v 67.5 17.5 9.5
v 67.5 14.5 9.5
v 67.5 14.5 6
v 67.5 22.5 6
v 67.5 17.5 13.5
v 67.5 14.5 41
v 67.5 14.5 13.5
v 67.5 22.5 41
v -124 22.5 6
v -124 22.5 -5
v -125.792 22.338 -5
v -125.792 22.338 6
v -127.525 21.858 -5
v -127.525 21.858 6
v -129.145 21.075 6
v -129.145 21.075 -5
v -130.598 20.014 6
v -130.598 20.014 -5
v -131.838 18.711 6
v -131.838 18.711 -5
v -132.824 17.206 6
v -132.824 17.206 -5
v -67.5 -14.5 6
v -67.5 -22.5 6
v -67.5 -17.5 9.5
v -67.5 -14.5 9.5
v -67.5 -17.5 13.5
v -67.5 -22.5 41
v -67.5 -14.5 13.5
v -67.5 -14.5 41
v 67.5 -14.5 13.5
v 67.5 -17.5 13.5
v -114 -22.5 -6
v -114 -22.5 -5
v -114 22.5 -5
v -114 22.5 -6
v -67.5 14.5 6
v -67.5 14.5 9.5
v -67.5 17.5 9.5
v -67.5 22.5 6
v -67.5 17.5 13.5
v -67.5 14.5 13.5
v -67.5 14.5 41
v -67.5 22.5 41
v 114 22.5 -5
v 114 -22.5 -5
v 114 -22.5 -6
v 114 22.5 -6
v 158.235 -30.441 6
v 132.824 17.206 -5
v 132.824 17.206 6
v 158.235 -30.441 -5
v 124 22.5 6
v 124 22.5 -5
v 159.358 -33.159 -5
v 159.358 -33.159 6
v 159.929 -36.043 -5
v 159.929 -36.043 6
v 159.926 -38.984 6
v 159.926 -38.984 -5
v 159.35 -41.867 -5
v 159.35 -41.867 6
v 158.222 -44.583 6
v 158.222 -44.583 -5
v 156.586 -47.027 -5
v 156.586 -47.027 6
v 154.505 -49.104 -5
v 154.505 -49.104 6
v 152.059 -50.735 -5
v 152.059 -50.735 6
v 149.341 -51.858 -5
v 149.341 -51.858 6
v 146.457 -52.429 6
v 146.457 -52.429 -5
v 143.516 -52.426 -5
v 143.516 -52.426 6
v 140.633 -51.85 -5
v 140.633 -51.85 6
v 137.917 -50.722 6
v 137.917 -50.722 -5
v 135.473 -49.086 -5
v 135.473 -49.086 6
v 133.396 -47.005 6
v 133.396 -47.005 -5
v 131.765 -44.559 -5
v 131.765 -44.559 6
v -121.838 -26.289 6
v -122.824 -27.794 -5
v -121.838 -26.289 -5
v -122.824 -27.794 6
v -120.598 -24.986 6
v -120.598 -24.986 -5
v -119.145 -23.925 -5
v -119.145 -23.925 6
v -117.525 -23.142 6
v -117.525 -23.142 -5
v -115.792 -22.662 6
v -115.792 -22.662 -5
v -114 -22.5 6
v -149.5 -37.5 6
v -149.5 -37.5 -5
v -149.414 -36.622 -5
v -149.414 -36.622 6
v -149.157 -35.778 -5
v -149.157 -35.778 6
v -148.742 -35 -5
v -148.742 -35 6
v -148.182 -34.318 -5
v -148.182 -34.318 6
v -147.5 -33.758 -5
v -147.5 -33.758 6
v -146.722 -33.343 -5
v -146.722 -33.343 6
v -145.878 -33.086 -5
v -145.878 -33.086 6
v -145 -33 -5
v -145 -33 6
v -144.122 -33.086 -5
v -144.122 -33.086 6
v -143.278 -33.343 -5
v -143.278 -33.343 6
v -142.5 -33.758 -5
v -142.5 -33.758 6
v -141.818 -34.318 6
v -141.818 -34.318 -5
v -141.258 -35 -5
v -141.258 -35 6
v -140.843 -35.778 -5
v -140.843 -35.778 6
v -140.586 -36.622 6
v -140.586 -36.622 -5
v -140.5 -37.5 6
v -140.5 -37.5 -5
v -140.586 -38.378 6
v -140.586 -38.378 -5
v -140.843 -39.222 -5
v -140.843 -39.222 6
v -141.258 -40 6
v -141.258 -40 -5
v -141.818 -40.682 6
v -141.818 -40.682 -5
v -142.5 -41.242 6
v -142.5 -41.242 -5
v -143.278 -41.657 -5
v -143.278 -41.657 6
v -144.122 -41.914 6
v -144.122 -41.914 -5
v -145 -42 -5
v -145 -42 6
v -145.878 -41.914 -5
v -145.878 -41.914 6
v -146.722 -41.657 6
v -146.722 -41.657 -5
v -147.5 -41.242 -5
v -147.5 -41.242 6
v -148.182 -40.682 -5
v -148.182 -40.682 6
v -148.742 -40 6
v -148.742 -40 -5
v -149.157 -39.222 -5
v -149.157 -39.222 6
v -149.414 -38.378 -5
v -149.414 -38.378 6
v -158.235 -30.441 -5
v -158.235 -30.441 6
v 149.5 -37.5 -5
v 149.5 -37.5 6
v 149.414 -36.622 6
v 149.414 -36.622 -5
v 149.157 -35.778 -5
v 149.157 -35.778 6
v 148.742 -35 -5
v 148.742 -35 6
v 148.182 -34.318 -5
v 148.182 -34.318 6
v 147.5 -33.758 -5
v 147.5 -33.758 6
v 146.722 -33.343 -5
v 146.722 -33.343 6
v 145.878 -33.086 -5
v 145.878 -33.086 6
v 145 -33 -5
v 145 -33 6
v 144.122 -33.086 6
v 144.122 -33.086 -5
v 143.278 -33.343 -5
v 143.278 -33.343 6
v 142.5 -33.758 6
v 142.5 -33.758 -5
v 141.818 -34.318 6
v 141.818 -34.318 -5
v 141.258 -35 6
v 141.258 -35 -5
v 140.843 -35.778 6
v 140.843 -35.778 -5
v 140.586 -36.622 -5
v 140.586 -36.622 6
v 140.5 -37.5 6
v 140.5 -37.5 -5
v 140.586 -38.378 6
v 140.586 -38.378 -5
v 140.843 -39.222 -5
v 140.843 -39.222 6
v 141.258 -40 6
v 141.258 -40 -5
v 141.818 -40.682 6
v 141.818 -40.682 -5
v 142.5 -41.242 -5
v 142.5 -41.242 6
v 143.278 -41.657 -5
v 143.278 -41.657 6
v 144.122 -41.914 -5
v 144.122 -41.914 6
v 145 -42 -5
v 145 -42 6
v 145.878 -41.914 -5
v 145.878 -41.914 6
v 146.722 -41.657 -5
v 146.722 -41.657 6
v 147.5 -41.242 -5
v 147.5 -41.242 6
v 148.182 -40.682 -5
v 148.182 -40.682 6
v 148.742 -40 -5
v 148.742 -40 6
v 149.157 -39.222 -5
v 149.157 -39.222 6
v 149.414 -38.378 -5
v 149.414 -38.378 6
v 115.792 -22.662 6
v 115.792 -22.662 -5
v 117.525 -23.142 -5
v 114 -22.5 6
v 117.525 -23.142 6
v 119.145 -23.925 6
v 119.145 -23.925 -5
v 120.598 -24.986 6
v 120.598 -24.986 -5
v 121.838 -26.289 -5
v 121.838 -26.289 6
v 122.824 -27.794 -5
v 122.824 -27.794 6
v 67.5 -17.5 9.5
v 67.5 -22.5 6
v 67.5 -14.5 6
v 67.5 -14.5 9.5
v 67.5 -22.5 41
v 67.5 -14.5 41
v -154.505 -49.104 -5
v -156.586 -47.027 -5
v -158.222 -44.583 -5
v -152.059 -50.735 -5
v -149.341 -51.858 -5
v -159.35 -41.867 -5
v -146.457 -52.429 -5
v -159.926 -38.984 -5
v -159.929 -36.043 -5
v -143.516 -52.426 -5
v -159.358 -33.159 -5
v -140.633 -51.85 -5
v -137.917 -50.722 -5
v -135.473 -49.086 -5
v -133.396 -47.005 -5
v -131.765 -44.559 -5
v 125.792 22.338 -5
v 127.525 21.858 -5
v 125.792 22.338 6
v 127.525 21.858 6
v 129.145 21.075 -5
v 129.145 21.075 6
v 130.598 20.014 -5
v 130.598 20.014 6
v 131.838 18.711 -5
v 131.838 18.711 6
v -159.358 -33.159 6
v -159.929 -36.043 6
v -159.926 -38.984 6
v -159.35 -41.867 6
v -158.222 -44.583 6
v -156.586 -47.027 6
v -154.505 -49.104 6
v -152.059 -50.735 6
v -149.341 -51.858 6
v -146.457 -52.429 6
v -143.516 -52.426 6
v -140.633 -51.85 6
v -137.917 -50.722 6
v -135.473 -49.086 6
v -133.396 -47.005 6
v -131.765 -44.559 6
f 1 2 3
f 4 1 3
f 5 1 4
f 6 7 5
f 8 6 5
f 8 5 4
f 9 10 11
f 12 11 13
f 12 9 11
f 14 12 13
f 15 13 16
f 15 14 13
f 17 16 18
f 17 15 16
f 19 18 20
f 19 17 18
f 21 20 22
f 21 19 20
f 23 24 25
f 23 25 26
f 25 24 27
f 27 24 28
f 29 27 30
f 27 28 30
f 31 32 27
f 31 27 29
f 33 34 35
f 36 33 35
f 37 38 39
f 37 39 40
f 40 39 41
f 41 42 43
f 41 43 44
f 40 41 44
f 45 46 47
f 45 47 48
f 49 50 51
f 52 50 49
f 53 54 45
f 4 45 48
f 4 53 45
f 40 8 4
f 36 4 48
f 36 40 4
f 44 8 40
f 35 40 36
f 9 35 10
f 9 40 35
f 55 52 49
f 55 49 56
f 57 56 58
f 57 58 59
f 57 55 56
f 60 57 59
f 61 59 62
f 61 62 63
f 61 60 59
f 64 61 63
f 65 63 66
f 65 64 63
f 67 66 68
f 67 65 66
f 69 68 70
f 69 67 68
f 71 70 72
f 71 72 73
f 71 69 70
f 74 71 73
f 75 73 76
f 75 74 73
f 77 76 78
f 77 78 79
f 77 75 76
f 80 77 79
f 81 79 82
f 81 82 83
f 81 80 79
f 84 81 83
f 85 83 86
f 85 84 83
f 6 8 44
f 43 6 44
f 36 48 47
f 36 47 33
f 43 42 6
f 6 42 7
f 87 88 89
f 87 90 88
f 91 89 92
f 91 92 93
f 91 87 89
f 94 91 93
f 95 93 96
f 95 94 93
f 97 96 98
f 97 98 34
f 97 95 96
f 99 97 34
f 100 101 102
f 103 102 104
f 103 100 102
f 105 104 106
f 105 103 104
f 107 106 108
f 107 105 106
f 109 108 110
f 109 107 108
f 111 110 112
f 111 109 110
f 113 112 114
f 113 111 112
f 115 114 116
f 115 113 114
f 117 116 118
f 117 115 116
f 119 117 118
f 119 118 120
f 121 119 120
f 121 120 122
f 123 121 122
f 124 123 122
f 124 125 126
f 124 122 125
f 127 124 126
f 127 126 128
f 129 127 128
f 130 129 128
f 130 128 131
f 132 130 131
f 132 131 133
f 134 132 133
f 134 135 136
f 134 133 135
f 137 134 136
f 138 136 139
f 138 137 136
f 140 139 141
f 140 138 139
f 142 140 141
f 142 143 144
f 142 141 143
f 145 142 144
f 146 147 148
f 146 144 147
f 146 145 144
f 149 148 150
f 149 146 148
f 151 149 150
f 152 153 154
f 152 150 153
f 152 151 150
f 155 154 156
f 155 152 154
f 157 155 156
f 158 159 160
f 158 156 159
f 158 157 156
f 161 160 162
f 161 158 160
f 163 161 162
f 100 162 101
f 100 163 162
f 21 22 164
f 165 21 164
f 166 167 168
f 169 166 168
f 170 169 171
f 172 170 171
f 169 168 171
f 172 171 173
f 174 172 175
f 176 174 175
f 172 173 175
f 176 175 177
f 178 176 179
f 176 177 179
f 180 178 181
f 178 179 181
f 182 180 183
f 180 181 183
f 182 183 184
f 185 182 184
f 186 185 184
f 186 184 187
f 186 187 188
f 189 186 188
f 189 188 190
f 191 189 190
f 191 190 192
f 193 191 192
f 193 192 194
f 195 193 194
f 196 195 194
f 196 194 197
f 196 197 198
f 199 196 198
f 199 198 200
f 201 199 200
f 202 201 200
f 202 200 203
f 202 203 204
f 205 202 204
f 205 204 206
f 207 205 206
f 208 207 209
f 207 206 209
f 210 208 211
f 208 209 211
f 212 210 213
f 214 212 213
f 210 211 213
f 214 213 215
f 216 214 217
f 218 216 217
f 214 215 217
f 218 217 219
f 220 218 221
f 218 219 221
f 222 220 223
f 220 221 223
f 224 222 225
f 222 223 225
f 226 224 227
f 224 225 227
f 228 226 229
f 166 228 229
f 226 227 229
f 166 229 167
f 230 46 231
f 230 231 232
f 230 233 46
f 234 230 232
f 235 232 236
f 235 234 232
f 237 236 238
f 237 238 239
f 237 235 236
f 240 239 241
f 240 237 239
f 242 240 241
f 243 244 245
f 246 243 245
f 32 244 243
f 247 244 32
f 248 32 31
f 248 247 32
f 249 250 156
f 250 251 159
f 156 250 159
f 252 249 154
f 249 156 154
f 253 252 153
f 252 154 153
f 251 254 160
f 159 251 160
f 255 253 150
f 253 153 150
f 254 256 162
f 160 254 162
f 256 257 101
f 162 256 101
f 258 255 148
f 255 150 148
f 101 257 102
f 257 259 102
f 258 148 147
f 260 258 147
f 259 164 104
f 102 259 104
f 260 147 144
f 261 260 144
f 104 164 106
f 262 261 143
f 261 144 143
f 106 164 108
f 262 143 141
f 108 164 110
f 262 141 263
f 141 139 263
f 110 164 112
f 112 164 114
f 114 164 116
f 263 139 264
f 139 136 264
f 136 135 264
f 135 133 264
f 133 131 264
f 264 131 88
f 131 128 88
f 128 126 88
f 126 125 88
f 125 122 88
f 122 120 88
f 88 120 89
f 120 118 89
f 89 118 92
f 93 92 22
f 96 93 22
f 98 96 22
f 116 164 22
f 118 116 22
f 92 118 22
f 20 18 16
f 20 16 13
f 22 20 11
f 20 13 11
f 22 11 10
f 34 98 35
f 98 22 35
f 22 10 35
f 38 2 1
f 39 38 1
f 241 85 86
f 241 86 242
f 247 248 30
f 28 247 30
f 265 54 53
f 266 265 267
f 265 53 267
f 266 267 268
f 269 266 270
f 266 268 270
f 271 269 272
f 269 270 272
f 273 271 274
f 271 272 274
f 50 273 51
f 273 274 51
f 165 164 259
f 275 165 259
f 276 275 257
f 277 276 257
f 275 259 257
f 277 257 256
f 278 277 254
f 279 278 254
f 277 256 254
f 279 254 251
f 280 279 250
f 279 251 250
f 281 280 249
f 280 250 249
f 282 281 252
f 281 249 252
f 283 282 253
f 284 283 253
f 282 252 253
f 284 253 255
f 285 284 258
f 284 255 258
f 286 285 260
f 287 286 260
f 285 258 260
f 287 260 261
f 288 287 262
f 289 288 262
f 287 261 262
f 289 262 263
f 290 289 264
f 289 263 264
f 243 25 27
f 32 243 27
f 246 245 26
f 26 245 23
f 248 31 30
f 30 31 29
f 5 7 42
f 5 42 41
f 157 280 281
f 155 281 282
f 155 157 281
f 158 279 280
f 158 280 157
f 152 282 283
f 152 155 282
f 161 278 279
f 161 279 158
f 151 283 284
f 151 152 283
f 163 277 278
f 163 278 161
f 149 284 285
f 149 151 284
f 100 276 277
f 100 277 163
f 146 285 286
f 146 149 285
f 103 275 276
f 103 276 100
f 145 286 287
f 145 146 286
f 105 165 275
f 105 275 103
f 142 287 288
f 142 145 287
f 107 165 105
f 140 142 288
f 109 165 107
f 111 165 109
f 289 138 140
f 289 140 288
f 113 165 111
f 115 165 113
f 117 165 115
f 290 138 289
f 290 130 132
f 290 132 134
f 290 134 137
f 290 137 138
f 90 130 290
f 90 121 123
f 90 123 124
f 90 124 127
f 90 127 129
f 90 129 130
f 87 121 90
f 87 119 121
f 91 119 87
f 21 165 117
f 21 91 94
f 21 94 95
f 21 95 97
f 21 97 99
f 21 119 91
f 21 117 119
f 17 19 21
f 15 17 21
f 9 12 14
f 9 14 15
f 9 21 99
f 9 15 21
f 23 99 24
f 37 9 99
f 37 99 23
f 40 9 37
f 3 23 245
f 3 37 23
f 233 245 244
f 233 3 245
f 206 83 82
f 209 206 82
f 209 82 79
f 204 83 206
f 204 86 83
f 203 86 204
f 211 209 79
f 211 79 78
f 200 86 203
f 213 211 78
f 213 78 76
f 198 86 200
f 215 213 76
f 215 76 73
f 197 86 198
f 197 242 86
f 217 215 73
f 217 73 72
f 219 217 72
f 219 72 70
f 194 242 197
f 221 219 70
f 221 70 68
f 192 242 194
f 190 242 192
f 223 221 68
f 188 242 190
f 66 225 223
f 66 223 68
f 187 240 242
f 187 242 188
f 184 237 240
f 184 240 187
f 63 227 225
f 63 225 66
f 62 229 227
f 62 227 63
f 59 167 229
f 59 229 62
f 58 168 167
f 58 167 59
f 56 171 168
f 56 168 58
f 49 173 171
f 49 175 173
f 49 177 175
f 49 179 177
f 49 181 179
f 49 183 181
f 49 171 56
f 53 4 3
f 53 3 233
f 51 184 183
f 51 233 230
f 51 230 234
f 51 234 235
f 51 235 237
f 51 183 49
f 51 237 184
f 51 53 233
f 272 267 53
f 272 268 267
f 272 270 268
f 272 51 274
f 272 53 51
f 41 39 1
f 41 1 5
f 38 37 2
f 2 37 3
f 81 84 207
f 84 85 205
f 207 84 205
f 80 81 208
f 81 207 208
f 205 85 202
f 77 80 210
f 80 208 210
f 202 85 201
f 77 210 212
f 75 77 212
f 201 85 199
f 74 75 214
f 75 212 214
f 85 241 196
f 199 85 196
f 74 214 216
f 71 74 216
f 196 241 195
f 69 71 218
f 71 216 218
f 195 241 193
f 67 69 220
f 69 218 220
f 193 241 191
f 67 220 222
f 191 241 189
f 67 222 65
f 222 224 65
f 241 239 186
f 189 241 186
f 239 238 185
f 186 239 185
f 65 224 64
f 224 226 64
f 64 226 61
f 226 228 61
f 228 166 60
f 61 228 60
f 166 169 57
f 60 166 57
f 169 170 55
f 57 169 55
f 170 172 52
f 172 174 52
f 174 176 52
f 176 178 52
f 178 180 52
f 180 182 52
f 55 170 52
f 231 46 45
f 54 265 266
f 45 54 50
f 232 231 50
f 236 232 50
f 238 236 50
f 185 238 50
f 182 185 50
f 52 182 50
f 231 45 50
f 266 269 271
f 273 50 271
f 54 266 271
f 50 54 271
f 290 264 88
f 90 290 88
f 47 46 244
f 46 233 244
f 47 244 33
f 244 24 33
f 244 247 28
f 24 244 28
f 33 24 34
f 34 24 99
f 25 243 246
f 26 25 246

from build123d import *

# Parameters (mm, degrees)
SKETCH_1_W          = 220
SKETCH_1_H          = 45
EXTRUDE_1_DEPTH     = 6
EXTRUDE_2_DEPTH     = 35
SKETCH_5_W          = 4
SKETCH_5_H          = 3
CUT_EXTRUDE_3_DEPTH = 194.244663574
SKETCH_6_W          = 220
SKETCH_6_H          = 45
EXTRUDE_3_DEPTH     = 5
EXTRUDE_4_DEPTH     = 11
SKETCH_10_R         = 4.5
CUT_EXTRUDE_4_DEPTH = 172.992005628
FILLET_1_R          = 10
SKETCH_11_W         = 10
SKETCH_11_H         = 8
CUT_EXTRUDE_6_DEPTH = 35
SKETCH_18_W         = 228
SKETCH_18_H         = 45
EXTRUDE_5_DEPTH     = 1


with BuildPart() as part:
    # 草图1 → 凸台-拉伸1 (new body)
    with BuildSketch(Plane.XY):
        Rectangle(SKETCH_1_W, SKETCH_1_H)
    extrude(amount=EXTRUDE_1_DEPTH)

    # 草图2 → 凸台-拉伸2 (add)
    with BuildSketch(Plane.XY.offset(6)):
        Polygon((-77.5, 22.5), (77.5, 22.5), (77.5, 14.5), (75, 14.5), (-75, 14.5), (-77.5, 14.5), align=None)
        Polygon((-75, -14.5), (75, -14.5), (77.5, -14.5), (77.5, -22.5), (-77.5, -22.5), (-77.5, -14.5), align=None)
    extrude(amount=EXTRUDE_2_DEPTH)

    # 草图5 → 切除-拉伸3 (cut, through all)
    with BuildSketch(Plane.ZY.offset(77.5)):
        with Locations((11.5, -16)):
            Rectangle(SKETCH_5_W, SKETCH_5_H)
        with Locations((11.5, 16)):
            Rectangle(SKETCH_5_W, SKETCH_5_H)
    extrude(amount=-CUT_EXTRUDE_3_DEPTH, mode=Mode.SUBTRACT)

    # 草图6 → 凸台-拉伸3 (add)
    with BuildSketch(Plane(origin=(0, 0, 0), x_dir=(-1, 0, 0), z_dir=(0, 0, -1))):
        Rectangle(SKETCH_6_W, SKETCH_6_H)
    extrude(amount=EXTRUDE_3_DEPTH)

    # 草图9 → 凸台-拉伸4 (add)
    with BuildSketch(Plane(origin=(0, 0, -5), x_dir=(-1, 0, 0), z_dir=(0, 0, -1))):
        with BuildLine():
            Line((-110, -22.5), (-110, 22.5))
            Line((-110, 22.5), (-130, 22.5))
            Line((-130, 22.5), (-158.235294118, -30.441176471))
            ThreePointArc((-158.235294118, -30.441176471), (-152.058823529, -50.735294118), (-131.764705882, -44.558823529))
            Line((-131.764705882, -44.558823529), (-120, -22.5))
            Line((-120, -22.5), (-110, -22.5))
        make_face()
    extrude_4 = extrude(amount=-EXTRUDE_4_DEPTH)

    # 草图10 → 切除-拉伸4 (cut, through all)
    with BuildSketch(Plane.XY.offset(6)):
        with Locations((145, -37.5)):
            Circle(SKETCH_10_R)
    cut_extrude_4 = extrude(amount=-CUT_EXTRUDE_4_DEPTH, mode=Mode.SUBTRACT)

    # 镜向1: 凸台-拉伸4, 切除-拉伸4 across plane
    add(extrude_4.mirror(Plane(origin=(0, 0, 0), x_dir=(0, 0, 1), z_dir=(1, 0, 0))))
    add(cut_extrude_4.mirror(Plane(origin=(0, 0, 0), x_dir=(0, 0, 1), z_dir=(1, 0, 0))), mode=Mode.SUBTRACT)

    # 圆角1
    fillet_1_edges = [part.edges().sort_by_distance(p)[0] for p in [
        (-130, 22.5, 0.5),
        (-120, -22.5, 0.5),
        (130, 22.5, 0.5),
        (120, -22.5, 0.5),
    ]]
    fillet(fillet_1_edges, radius=FILLET_1_R)

    # 草图11 → 切除-拉伸6 (cut)
    with BuildSketch(Plane.XY.offset(41)):
        with Locations((-72.5, 18.5)):
            Rectangle(SKETCH_11_W, SKETCH_11_H)
        with Locations((72.5, 18.5)):
            Rectangle(SKETCH_11_W, SKETCH_11_H)
        with Locations((72.5, -18.5)):
            Rectangle(SKETCH_11_W, SKETCH_11_H)
        with Locations((-72.5, -18.5)):
            Rectangle(SKETCH_11_W, SKETCH_11_H)
    extrude(amount=-CUT_EXTRUDE_6_DEPTH, mode=Mode.SUBTRACT)

    # 草图18 → 凸台-拉伸5 (add)
    with BuildSketch(Plane(origin=(0, 0, -5), x_dir=(-1, 0, 0), z_dir=(0, 0, -1))):
        Rectangle(SKETCH_18_W, SKETCH_18_H)
    extrude(amount=EXTRUDE_5_DEPTH)


solid = part.part
